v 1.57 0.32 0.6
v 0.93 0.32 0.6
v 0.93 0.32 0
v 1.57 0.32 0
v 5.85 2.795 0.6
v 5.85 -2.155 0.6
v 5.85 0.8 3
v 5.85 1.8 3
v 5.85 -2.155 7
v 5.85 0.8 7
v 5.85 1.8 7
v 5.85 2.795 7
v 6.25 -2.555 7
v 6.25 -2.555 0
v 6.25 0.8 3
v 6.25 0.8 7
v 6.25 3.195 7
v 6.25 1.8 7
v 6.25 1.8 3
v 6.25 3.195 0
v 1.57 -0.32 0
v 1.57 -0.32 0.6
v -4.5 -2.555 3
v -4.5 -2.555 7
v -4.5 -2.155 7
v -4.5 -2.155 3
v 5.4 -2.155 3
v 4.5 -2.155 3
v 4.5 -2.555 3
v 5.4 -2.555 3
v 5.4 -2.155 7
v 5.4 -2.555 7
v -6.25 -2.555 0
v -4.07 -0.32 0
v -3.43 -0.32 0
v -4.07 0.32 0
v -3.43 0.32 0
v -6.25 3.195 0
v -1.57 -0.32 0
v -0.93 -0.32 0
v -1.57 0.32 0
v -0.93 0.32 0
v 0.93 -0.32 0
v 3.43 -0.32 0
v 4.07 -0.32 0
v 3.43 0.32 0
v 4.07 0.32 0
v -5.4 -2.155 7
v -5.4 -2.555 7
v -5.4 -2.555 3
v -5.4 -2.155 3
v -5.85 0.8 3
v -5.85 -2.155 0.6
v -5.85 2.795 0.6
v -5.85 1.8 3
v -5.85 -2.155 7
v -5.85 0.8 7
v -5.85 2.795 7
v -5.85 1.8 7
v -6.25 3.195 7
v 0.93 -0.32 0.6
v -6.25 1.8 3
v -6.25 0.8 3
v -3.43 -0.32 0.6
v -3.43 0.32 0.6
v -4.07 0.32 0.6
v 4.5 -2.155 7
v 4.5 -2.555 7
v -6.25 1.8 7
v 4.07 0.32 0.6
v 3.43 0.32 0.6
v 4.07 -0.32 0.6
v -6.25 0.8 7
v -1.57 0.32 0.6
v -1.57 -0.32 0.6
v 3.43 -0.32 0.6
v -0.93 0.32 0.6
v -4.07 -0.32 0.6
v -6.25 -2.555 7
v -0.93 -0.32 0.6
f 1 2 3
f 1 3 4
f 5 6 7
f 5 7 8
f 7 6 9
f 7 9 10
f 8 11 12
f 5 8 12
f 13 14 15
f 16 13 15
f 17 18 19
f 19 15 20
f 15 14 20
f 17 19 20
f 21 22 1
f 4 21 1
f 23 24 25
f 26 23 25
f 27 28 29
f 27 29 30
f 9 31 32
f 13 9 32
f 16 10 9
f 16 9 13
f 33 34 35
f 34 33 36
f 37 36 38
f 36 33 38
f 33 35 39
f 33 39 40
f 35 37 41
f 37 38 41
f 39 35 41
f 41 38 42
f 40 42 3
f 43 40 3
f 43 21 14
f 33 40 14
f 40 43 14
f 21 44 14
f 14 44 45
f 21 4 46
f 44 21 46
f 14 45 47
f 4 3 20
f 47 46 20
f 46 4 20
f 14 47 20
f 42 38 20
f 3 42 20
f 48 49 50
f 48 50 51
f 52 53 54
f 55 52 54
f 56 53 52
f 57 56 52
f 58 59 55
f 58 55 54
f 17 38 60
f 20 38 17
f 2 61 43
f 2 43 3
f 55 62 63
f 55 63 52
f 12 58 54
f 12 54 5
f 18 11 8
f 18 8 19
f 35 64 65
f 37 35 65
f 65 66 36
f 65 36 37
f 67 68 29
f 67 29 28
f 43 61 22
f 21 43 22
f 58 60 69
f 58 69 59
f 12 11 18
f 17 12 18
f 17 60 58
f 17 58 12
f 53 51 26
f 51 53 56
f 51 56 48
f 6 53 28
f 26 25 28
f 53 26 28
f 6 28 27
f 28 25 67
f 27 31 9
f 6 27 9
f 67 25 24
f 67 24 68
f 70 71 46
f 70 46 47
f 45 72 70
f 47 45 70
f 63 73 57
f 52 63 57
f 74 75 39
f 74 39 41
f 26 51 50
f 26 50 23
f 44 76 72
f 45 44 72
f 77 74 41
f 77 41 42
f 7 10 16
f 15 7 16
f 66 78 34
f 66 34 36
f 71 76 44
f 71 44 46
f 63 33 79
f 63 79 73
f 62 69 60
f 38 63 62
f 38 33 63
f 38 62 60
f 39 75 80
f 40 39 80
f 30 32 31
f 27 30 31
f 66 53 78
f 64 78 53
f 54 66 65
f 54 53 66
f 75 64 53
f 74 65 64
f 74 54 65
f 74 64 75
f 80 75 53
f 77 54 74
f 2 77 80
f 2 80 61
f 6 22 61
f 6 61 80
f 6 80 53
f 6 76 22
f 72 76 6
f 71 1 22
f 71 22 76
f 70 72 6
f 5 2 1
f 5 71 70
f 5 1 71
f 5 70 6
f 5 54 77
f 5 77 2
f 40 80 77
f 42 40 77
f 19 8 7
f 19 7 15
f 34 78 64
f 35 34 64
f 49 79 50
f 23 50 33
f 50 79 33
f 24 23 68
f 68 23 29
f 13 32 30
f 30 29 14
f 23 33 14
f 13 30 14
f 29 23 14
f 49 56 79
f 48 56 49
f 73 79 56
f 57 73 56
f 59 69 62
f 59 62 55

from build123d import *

# Parameters (mm, degrees)
F1_W      = 12.5
F1_H      = 5.75
F2_DEPTH  = 7
F3_W      = 11.7
F3_H      = 4.95
F4_DEPTH  = 6.4
F5_W      = 0.64
F5_H      = 0.64
F6_DEPTH  = 0.601
F7_W      = 0.9
F7_H      = 0.4
F8_DEPTH  = 4
F9_W      = 0.4
F9_H      = 1
F10_DEPTH = 4


# Not quite as in the source:
# - a feature names something its author has since deleted; it is built from what else it names


with BuildPart() as f2:
    # F1 (on Top) → F2 (new body)
    with BuildSketch(Plane.XY):
        with Locations((0, 0.32)):
            Rectangle(F1_W, F1_H)
    extrude(amount=F2_DEPTH)

    # F3 (on face) → F4 (cut)
    with BuildSketch(Plane.XY.offset(7)):
        with Locations((0, 0.32)):
            Rectangle(F3_W, F3_H)
    extrude(amount=-F4_DEPTH, mode=Mode.SUBTRACT)

    # F5 (on face) → F6 (cut, through all)
    with BuildSketch(Plane.XY.offset(0.6)):
        with Locations((-1.25, 0)):
            Rectangle(F5_W, F5_H)
        with Locations((-3.75, 0)):
            Rectangle(F5_W, F5_H)
        with Locations((1.25, 0)):
            Rectangle(F5_W, F5_H)
        with Locations((3.75, 0)):
            Rectangle(F5_W, F5_H)
    extrude(amount=-F6_DEPTH, mode=Mode.SUBTRACT)

    # F7 (on face) → F8 (cut)
    with BuildSketch(Plane.XY.offset(7)):
        with Locations((-4.95, -2.355)):
            Rectangle(F7_W, F7_H)
        with Locations((4.95, -2.355)):
            Rectangle(F7_W, F7_H)
    extrude(amount=-F8_DEPTH, mode=Mode.SUBTRACT)

    # F9 (on face) → F10 (cut)
    with BuildSketch(Plane.XY.offset(7)):
        with Locations((-6.05, 1.3)):
            Rectangle(F9_W, F9_H)
        with Locations((6.05, 1.3)):
            Rectangle(F9_W, F9_H)
    extrude(amount=-F10_DEPTH, mode=Mode.SUBTRACT)


solid = f2.part
